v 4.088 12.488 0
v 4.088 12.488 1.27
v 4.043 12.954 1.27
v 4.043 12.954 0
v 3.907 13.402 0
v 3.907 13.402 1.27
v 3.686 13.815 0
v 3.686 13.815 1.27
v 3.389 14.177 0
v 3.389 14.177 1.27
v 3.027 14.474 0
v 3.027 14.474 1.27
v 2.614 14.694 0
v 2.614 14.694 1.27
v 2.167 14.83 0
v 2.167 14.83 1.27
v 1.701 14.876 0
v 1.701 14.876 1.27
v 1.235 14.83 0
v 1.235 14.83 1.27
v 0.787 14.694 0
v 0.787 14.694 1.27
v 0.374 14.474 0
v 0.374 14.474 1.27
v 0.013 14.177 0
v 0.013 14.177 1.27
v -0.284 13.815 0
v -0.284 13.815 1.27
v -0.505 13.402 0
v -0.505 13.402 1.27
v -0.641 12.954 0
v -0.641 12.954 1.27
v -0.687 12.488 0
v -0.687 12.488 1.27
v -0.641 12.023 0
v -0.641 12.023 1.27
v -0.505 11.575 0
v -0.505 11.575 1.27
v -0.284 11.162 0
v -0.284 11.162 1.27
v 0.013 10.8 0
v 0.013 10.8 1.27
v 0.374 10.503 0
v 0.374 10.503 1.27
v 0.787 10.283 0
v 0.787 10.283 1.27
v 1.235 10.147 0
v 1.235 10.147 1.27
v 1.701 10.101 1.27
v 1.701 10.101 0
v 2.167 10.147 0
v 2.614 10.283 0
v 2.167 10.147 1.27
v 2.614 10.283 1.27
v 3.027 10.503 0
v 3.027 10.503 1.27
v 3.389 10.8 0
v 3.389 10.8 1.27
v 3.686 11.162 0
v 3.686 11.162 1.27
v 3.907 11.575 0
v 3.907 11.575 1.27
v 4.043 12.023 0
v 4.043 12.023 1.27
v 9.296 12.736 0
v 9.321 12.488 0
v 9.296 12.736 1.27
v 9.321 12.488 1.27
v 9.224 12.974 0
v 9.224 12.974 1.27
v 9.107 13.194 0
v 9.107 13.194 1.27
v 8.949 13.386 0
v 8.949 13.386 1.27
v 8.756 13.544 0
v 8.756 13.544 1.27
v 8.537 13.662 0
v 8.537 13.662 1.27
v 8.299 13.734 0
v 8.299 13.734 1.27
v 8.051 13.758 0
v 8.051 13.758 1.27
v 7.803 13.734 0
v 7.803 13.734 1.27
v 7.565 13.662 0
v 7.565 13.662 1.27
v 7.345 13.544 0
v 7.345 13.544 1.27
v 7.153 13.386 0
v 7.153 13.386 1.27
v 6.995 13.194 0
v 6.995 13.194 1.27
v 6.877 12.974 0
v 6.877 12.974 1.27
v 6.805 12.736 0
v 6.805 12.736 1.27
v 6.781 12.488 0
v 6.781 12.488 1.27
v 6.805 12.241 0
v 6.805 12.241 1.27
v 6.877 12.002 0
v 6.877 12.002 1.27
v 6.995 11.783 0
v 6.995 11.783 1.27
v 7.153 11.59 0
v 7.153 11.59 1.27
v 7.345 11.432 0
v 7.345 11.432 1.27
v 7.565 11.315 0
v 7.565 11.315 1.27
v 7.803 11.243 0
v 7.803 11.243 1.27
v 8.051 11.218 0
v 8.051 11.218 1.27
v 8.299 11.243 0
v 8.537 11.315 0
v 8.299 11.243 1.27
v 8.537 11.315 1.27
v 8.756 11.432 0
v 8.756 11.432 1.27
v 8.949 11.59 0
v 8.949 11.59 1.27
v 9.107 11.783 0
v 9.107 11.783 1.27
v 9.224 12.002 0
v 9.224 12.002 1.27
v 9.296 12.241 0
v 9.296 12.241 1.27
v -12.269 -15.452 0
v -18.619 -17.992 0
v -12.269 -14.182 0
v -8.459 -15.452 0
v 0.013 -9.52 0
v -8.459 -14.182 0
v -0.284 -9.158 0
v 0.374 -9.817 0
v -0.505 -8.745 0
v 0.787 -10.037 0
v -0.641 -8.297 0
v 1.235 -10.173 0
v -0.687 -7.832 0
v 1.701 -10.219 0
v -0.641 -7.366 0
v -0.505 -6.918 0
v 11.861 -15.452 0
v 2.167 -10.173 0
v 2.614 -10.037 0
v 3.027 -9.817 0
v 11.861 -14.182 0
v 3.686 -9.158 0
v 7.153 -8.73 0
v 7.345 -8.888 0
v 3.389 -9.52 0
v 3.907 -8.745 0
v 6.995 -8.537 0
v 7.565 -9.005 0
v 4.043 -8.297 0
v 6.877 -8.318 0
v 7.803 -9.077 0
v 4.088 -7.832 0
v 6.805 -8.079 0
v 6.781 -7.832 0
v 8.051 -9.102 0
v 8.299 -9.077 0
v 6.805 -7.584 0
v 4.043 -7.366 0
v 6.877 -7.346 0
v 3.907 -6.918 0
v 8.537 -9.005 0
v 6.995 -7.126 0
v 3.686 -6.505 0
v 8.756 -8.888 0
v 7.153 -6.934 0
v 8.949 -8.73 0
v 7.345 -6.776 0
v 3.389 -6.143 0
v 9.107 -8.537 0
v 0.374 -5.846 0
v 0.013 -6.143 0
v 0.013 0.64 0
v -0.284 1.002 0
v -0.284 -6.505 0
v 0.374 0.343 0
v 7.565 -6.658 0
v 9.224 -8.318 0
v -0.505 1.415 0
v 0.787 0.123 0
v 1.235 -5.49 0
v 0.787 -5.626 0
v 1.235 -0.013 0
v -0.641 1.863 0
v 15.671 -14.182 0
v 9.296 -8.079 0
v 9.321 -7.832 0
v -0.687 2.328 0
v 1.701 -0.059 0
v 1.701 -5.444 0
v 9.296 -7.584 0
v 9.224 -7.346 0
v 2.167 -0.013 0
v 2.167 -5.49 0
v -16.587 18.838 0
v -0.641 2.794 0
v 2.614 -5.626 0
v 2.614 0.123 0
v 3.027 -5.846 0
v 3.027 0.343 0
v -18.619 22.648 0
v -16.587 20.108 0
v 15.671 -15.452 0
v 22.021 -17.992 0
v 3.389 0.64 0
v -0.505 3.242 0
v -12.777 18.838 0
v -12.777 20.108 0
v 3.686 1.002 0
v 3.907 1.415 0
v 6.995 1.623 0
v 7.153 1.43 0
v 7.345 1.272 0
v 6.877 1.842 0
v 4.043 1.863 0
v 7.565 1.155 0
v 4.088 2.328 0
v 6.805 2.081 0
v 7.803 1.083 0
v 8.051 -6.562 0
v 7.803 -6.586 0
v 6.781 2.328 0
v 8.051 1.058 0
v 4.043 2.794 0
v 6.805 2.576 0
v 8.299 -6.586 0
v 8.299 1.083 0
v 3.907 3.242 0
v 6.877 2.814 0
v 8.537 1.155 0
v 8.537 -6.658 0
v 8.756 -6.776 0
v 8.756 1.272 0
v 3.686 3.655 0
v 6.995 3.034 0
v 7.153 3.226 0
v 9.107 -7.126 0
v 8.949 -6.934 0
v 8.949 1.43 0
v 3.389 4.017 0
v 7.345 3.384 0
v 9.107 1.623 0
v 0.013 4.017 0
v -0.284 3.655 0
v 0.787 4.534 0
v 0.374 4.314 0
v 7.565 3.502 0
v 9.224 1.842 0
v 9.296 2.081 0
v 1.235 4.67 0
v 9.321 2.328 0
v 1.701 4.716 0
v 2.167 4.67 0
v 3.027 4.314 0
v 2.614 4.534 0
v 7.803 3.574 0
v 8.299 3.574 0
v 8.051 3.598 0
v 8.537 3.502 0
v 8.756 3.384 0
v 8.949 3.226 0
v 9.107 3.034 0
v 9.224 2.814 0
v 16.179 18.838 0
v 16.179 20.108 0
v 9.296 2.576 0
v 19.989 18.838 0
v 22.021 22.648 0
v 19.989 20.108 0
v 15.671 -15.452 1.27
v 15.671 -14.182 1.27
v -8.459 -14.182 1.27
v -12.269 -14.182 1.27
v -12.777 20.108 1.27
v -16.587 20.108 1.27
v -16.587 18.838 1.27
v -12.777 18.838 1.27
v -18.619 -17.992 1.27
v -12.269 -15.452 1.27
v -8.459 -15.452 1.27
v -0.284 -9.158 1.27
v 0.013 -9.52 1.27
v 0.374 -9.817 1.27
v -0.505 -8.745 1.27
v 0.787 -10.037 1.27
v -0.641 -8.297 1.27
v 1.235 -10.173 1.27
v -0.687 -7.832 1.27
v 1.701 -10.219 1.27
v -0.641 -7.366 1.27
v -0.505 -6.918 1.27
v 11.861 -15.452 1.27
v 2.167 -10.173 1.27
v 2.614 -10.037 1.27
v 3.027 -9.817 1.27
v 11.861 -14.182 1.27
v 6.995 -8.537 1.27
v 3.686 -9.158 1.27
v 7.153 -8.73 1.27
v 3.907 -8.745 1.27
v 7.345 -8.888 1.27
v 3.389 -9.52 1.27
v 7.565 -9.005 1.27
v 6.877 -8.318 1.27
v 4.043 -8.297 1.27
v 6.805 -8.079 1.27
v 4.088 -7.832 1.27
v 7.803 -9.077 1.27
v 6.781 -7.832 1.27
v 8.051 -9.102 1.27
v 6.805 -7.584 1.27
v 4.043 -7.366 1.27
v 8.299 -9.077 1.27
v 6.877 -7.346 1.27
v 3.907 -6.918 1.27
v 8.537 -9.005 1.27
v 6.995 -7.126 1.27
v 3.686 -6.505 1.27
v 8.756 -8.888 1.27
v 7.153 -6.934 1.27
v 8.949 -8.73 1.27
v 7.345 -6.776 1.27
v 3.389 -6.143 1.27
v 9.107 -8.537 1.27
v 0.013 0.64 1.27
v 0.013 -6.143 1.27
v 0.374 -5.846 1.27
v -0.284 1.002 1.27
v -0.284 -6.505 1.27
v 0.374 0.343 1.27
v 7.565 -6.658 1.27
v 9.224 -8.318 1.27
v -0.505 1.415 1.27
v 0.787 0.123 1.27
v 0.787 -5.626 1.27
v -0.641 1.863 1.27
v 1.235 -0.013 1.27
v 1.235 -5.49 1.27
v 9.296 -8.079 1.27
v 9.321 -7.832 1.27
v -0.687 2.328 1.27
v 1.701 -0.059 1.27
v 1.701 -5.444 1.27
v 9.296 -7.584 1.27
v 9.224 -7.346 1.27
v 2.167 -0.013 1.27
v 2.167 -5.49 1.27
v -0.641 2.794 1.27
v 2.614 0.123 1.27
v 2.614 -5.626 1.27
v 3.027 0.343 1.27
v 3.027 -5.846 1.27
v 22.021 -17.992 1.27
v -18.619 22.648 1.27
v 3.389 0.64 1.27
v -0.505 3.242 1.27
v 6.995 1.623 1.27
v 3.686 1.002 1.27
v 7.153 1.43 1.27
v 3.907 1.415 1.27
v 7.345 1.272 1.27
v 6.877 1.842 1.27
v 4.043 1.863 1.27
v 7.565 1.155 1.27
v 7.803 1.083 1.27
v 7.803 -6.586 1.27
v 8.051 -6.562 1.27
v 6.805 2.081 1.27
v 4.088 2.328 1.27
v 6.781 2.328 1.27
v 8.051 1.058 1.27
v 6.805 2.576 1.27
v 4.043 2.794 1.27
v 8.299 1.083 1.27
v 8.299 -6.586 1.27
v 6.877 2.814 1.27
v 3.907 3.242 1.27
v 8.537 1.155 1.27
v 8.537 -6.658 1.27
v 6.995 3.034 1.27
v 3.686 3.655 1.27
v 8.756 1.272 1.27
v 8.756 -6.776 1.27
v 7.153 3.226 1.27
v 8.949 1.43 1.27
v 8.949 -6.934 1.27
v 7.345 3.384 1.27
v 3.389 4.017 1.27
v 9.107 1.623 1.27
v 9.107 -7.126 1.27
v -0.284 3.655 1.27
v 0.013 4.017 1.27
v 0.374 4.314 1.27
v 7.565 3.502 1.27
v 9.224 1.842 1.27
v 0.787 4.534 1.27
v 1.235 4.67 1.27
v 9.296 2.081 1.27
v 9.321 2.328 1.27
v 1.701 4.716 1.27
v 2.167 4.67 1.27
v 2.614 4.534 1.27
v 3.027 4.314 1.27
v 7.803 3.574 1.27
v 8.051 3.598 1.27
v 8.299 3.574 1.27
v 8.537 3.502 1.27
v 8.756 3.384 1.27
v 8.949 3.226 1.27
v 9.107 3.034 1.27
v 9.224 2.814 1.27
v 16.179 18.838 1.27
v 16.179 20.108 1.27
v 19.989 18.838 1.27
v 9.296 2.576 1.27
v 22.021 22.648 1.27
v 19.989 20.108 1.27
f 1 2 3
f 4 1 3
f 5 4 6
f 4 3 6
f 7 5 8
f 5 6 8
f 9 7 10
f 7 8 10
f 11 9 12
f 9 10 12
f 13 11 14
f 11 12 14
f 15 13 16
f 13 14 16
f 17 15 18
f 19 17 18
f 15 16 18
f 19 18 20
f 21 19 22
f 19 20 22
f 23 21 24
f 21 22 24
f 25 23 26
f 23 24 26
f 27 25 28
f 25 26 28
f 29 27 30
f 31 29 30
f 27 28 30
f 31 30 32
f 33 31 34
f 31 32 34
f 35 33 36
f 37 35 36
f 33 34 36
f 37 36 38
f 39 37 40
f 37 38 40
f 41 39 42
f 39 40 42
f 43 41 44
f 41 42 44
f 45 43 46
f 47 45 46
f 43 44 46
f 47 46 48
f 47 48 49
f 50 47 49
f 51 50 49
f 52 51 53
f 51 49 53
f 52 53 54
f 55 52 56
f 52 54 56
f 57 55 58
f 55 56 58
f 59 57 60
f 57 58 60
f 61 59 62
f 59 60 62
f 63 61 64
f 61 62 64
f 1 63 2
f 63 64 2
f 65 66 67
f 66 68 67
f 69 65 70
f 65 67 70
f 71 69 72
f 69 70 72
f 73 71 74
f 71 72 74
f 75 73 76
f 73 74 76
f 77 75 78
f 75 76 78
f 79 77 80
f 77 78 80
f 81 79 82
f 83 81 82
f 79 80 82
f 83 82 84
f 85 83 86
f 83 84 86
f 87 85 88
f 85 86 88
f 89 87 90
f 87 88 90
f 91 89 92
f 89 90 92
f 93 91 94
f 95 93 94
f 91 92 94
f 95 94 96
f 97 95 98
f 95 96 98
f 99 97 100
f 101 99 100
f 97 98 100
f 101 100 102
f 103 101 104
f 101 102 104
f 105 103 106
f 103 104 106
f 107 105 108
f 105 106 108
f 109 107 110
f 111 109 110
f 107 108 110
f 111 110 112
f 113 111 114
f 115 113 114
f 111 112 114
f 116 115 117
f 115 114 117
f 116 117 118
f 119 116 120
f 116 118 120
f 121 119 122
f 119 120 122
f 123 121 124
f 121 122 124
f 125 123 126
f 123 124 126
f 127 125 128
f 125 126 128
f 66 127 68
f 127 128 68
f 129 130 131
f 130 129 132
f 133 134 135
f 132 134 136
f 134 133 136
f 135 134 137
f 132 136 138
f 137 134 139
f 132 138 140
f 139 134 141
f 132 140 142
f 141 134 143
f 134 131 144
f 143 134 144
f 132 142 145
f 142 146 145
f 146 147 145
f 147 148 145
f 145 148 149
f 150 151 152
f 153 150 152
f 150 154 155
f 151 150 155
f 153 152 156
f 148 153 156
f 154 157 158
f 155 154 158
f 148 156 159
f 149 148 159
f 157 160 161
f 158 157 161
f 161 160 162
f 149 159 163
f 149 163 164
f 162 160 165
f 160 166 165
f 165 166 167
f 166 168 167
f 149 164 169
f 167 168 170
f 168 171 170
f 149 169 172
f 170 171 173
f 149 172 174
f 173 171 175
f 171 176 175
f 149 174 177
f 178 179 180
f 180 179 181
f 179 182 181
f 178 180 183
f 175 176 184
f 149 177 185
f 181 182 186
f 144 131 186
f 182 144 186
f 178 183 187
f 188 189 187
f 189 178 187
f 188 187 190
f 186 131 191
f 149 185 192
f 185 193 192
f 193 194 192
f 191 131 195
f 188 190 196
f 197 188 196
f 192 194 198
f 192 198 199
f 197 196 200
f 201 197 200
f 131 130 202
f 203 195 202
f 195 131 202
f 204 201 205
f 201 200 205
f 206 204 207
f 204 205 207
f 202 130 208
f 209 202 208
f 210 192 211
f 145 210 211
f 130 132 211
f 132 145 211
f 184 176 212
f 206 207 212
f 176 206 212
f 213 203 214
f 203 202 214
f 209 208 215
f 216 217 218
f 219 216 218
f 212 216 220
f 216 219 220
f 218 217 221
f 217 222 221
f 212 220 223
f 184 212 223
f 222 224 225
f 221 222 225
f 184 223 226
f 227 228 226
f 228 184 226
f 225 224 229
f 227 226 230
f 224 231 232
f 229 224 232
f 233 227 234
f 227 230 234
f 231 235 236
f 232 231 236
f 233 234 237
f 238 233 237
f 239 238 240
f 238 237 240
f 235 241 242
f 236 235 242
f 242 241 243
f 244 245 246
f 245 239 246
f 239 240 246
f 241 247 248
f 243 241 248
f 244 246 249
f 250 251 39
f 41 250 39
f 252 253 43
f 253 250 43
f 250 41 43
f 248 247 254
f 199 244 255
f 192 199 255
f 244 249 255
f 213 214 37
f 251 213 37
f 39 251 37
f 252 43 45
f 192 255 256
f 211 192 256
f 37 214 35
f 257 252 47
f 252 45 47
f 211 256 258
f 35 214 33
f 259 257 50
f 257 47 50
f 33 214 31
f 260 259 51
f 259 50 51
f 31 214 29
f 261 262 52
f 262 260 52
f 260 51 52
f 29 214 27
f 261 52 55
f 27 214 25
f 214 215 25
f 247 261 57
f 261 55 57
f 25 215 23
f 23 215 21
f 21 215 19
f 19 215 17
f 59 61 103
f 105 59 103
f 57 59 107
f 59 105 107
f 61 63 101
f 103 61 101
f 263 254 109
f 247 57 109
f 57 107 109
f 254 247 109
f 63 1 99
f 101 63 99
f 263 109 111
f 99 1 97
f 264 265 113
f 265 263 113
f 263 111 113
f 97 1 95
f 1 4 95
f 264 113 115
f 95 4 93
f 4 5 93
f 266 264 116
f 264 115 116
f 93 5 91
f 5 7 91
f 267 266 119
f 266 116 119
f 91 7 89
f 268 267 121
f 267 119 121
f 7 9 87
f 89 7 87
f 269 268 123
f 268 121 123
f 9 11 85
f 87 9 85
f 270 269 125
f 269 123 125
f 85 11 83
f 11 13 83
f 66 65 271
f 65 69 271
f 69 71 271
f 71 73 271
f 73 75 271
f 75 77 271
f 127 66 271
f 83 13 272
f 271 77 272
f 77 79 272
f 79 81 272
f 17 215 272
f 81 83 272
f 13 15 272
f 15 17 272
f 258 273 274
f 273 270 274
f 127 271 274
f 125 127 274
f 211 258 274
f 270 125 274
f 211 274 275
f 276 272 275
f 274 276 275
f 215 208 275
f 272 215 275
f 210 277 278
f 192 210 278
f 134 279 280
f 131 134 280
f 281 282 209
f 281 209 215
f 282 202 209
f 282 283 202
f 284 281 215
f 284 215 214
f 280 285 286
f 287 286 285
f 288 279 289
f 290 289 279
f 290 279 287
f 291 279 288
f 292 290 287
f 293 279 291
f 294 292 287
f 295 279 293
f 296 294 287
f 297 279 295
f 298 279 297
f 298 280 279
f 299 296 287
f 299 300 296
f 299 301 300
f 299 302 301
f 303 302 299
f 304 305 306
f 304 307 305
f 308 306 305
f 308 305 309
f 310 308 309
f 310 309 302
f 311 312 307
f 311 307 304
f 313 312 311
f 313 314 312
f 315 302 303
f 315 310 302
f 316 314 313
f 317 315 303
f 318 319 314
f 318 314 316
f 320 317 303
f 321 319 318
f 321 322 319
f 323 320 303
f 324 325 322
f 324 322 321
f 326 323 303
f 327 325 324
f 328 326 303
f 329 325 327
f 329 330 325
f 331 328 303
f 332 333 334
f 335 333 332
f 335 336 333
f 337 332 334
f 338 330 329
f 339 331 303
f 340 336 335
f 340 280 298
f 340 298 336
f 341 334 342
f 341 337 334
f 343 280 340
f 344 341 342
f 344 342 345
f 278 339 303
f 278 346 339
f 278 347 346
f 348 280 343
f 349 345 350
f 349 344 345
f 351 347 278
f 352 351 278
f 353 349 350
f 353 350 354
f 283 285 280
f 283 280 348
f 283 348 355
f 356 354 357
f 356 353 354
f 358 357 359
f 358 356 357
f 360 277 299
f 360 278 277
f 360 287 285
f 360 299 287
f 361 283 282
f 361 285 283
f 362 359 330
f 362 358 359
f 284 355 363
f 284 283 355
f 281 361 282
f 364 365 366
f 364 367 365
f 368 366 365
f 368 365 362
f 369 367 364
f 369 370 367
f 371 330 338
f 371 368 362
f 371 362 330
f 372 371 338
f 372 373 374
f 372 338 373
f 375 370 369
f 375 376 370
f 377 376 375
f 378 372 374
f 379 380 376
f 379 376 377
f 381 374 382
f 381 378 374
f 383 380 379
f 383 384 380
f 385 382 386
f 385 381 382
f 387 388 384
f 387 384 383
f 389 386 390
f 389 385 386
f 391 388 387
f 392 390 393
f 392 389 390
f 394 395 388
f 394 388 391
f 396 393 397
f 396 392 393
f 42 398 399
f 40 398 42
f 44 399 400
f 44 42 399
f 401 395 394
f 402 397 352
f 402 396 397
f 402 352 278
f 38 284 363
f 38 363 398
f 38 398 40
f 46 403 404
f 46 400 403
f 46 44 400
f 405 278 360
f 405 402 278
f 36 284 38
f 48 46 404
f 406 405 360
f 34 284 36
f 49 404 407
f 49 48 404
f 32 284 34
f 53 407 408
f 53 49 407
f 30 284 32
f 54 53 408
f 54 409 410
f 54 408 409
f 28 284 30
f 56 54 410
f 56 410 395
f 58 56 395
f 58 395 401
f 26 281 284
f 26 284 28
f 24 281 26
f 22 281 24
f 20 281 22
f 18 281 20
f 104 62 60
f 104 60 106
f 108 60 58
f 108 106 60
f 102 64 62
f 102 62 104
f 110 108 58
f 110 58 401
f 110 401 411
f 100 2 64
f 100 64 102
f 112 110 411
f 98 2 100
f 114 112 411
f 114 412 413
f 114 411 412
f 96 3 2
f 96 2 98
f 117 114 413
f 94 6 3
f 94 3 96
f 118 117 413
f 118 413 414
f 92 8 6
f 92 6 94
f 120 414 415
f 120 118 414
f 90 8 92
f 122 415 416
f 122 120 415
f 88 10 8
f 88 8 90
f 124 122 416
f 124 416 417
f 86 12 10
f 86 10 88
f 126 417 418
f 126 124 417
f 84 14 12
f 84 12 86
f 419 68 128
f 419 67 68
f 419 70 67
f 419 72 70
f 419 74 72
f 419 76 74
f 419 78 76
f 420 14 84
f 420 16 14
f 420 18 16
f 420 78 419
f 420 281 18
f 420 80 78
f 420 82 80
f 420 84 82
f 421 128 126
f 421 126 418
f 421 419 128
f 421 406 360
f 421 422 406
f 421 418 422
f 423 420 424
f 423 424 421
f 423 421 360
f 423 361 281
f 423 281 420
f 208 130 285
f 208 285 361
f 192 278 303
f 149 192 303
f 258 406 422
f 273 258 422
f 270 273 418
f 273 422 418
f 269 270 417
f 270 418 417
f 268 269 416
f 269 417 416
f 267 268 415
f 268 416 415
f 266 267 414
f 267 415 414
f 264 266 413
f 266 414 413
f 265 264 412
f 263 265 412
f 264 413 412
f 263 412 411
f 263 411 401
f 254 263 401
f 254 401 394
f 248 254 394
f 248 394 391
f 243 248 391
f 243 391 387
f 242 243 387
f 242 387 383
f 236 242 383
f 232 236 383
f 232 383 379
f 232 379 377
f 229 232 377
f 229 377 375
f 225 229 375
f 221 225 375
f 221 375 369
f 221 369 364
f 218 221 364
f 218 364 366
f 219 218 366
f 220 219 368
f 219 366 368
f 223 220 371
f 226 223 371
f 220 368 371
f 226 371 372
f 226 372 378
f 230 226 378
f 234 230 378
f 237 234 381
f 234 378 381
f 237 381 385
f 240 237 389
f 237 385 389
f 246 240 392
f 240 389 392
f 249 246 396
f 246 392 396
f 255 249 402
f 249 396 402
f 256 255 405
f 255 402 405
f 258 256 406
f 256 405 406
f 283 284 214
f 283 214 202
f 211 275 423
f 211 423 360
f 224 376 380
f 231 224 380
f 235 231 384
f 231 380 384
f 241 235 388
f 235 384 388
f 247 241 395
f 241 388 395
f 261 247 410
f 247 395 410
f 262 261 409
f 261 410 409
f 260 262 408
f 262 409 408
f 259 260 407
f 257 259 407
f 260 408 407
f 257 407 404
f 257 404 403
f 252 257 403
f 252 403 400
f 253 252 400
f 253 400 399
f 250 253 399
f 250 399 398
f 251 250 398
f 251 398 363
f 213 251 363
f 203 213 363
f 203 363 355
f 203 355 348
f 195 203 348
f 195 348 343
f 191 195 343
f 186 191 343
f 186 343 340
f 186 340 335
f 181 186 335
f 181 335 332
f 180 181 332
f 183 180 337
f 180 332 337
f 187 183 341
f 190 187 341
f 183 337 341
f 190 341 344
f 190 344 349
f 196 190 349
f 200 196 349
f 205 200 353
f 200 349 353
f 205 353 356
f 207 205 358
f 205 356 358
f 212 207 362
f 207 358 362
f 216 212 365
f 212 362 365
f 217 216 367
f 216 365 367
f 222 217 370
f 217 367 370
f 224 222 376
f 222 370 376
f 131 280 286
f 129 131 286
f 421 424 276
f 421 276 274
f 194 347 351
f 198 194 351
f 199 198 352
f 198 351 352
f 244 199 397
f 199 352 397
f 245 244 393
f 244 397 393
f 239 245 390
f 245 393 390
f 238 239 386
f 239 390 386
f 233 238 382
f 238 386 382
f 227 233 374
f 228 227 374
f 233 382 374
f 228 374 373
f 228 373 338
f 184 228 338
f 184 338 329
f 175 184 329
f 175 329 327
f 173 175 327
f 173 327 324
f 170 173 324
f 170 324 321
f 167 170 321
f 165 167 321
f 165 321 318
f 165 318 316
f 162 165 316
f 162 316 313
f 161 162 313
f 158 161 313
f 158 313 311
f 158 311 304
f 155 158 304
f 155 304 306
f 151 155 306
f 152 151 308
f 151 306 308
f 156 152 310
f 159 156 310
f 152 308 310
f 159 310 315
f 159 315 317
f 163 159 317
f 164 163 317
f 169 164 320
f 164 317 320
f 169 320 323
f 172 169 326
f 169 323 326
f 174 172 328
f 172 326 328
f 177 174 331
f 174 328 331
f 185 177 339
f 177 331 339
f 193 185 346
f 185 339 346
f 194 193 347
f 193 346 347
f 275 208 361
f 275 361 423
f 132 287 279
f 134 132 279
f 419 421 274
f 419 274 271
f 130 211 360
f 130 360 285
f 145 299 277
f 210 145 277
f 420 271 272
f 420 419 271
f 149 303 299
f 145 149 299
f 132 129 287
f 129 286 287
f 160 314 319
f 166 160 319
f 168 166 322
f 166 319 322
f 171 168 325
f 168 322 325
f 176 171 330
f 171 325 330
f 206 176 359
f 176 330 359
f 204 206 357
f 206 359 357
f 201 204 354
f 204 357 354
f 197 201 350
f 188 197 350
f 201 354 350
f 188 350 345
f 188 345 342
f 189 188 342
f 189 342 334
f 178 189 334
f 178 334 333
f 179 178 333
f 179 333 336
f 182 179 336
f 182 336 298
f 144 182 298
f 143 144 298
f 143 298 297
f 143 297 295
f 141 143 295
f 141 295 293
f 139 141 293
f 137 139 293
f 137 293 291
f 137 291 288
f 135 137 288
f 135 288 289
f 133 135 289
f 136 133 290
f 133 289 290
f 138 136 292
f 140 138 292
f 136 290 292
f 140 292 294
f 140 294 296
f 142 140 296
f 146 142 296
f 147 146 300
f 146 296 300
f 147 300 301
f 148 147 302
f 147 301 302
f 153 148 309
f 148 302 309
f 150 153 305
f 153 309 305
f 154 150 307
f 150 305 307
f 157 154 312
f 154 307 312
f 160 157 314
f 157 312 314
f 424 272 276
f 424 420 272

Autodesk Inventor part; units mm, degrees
ref_plane "YZ Plane" through (0, 0, 0) normal (1, 0, 0) x (0, 1, 0)
ref_plane "XZ Plane" through (0, 0, 0) normal (0, 1, 0) x (-1, 0, 0)
ref_plane "XY Plane" through (0, 0, 0) normal (0, 0, 1) x (1, 0, 0)
sketch "Sketch1" plane through (0, 0, 0) normal (0, 0, 1) x (1, 0, 0)
  line L0 (-18.6192, 22.6484) -> (22.0208, 22.6484)
  line L1 (22.0208, 22.6484) -> (22.0208, -17.9916)
  line L2 (22.0208, -17.9916) -> (-18.6192, -17.9916)
  line L3 (-18.6192, -17.9916) -> (-18.6192, 22.6484)
  dimension "d0" = 40.64
  dimension "d1" = 40.64
extrude "Extrusion1" add sketch "Sketch1" along normal blind 1.27
sketch "Sketch2" plane through (0, 0, 1.27) normal (0, 0, 1) x (1, 0, 0)
  line L0 (-18.6192, 22.6484) -> (22.0208, 22.6484) projected
  line L1 (-18.6192, -17.9916) -> (-18.6192, 22.6484) projected
  line L2 (-16.5872, 20.1084) -> (-12.7772, 20.1084)
  line L3 (-12.7772, 20.1084) -> (-12.7772, 18.8384)
  line L4 (-12.7772, 18.8384) -> (-16.5872, 18.8384)
  line L5 (-16.5872, 18.8384) -> (-16.5872, 20.1084)
  dimension "d4" = 2.54
  dimension "d5" = 1.27
  dimension "d6" = 2.032
  dimension "d7" = 3.81
extrude "Extrusion2" cut sketch "Sketch2" against normal through all
pattern_linear "Rectangular Pattern1" count 2 spacing 32.766 along (1, 0, 0) of "Extrusion2"
sketch "Sketch3" plane through (0, 0, 1.27) normal (0, 0, 1) x (1, 0, 0)
  line L0 (22.0208, 22.6484) -> (22.0208, -17.9916) projected
  line L1 (-18.6192, 22.6484) -> (22.0208, 22.6484) projected
  line L2 (-18.6192, -17.9916) -> (-18.6192, 22.6484) projected
  circle A0 centre (1.7008, 12.4884) radius 2.3876
  circle A1 centre (8.0508, 12.4884) radius 1.27
  circle A2 centre (1.7008, 12.4884) radius 20.32 construction
  dimension "d16" = 2.54
  dimension "d17" = 4.7752
  dimension "d18" = 6.35
  dimension "d19" = 10.16
extrude "Extrusion3" cut sketch "Sketch3" against normal through all
pattern_linear "Rectangular Pattern2" count 3 spacing 10.16 along (0, -1, 0) of "Extrusion3"
sketch "Sketch4" plane through (0, 0, 1.27) normal (0, 0, 1) x (1, 0, 0)
  line L0 (-18.6192, -17.9916) -> (-18.6192, 22.6484) projected
  line L1 (22.0208, -17.9916) -> (-18.6192, -17.9916) projected
  line L2 (-12.2692, -15.4516) -> (-8.4592, -15.4516)
  line L3 (-8.4592, -15.4516) -> (-8.4592, -14.1816)
  line L4 (-8.4592, -14.1816) -> (-12.2692, -14.1816)
  line L5 (-12.2692, -14.1816) -> (-12.2692, -15.4516)
  dimension "d25" = 3.81
  dimension "d26" = 1.27
  dimension "d27" = 2.54
  dimension "d28" = 6.35
extrude "Extrusion4" cut sketch "Sketch4" against normal through all
pattern_linear "Rectangular Pattern3" count 2 spacing 24.13 along (1, 0, 0) of "Extrusion4"
properties part number "fishpaper"
